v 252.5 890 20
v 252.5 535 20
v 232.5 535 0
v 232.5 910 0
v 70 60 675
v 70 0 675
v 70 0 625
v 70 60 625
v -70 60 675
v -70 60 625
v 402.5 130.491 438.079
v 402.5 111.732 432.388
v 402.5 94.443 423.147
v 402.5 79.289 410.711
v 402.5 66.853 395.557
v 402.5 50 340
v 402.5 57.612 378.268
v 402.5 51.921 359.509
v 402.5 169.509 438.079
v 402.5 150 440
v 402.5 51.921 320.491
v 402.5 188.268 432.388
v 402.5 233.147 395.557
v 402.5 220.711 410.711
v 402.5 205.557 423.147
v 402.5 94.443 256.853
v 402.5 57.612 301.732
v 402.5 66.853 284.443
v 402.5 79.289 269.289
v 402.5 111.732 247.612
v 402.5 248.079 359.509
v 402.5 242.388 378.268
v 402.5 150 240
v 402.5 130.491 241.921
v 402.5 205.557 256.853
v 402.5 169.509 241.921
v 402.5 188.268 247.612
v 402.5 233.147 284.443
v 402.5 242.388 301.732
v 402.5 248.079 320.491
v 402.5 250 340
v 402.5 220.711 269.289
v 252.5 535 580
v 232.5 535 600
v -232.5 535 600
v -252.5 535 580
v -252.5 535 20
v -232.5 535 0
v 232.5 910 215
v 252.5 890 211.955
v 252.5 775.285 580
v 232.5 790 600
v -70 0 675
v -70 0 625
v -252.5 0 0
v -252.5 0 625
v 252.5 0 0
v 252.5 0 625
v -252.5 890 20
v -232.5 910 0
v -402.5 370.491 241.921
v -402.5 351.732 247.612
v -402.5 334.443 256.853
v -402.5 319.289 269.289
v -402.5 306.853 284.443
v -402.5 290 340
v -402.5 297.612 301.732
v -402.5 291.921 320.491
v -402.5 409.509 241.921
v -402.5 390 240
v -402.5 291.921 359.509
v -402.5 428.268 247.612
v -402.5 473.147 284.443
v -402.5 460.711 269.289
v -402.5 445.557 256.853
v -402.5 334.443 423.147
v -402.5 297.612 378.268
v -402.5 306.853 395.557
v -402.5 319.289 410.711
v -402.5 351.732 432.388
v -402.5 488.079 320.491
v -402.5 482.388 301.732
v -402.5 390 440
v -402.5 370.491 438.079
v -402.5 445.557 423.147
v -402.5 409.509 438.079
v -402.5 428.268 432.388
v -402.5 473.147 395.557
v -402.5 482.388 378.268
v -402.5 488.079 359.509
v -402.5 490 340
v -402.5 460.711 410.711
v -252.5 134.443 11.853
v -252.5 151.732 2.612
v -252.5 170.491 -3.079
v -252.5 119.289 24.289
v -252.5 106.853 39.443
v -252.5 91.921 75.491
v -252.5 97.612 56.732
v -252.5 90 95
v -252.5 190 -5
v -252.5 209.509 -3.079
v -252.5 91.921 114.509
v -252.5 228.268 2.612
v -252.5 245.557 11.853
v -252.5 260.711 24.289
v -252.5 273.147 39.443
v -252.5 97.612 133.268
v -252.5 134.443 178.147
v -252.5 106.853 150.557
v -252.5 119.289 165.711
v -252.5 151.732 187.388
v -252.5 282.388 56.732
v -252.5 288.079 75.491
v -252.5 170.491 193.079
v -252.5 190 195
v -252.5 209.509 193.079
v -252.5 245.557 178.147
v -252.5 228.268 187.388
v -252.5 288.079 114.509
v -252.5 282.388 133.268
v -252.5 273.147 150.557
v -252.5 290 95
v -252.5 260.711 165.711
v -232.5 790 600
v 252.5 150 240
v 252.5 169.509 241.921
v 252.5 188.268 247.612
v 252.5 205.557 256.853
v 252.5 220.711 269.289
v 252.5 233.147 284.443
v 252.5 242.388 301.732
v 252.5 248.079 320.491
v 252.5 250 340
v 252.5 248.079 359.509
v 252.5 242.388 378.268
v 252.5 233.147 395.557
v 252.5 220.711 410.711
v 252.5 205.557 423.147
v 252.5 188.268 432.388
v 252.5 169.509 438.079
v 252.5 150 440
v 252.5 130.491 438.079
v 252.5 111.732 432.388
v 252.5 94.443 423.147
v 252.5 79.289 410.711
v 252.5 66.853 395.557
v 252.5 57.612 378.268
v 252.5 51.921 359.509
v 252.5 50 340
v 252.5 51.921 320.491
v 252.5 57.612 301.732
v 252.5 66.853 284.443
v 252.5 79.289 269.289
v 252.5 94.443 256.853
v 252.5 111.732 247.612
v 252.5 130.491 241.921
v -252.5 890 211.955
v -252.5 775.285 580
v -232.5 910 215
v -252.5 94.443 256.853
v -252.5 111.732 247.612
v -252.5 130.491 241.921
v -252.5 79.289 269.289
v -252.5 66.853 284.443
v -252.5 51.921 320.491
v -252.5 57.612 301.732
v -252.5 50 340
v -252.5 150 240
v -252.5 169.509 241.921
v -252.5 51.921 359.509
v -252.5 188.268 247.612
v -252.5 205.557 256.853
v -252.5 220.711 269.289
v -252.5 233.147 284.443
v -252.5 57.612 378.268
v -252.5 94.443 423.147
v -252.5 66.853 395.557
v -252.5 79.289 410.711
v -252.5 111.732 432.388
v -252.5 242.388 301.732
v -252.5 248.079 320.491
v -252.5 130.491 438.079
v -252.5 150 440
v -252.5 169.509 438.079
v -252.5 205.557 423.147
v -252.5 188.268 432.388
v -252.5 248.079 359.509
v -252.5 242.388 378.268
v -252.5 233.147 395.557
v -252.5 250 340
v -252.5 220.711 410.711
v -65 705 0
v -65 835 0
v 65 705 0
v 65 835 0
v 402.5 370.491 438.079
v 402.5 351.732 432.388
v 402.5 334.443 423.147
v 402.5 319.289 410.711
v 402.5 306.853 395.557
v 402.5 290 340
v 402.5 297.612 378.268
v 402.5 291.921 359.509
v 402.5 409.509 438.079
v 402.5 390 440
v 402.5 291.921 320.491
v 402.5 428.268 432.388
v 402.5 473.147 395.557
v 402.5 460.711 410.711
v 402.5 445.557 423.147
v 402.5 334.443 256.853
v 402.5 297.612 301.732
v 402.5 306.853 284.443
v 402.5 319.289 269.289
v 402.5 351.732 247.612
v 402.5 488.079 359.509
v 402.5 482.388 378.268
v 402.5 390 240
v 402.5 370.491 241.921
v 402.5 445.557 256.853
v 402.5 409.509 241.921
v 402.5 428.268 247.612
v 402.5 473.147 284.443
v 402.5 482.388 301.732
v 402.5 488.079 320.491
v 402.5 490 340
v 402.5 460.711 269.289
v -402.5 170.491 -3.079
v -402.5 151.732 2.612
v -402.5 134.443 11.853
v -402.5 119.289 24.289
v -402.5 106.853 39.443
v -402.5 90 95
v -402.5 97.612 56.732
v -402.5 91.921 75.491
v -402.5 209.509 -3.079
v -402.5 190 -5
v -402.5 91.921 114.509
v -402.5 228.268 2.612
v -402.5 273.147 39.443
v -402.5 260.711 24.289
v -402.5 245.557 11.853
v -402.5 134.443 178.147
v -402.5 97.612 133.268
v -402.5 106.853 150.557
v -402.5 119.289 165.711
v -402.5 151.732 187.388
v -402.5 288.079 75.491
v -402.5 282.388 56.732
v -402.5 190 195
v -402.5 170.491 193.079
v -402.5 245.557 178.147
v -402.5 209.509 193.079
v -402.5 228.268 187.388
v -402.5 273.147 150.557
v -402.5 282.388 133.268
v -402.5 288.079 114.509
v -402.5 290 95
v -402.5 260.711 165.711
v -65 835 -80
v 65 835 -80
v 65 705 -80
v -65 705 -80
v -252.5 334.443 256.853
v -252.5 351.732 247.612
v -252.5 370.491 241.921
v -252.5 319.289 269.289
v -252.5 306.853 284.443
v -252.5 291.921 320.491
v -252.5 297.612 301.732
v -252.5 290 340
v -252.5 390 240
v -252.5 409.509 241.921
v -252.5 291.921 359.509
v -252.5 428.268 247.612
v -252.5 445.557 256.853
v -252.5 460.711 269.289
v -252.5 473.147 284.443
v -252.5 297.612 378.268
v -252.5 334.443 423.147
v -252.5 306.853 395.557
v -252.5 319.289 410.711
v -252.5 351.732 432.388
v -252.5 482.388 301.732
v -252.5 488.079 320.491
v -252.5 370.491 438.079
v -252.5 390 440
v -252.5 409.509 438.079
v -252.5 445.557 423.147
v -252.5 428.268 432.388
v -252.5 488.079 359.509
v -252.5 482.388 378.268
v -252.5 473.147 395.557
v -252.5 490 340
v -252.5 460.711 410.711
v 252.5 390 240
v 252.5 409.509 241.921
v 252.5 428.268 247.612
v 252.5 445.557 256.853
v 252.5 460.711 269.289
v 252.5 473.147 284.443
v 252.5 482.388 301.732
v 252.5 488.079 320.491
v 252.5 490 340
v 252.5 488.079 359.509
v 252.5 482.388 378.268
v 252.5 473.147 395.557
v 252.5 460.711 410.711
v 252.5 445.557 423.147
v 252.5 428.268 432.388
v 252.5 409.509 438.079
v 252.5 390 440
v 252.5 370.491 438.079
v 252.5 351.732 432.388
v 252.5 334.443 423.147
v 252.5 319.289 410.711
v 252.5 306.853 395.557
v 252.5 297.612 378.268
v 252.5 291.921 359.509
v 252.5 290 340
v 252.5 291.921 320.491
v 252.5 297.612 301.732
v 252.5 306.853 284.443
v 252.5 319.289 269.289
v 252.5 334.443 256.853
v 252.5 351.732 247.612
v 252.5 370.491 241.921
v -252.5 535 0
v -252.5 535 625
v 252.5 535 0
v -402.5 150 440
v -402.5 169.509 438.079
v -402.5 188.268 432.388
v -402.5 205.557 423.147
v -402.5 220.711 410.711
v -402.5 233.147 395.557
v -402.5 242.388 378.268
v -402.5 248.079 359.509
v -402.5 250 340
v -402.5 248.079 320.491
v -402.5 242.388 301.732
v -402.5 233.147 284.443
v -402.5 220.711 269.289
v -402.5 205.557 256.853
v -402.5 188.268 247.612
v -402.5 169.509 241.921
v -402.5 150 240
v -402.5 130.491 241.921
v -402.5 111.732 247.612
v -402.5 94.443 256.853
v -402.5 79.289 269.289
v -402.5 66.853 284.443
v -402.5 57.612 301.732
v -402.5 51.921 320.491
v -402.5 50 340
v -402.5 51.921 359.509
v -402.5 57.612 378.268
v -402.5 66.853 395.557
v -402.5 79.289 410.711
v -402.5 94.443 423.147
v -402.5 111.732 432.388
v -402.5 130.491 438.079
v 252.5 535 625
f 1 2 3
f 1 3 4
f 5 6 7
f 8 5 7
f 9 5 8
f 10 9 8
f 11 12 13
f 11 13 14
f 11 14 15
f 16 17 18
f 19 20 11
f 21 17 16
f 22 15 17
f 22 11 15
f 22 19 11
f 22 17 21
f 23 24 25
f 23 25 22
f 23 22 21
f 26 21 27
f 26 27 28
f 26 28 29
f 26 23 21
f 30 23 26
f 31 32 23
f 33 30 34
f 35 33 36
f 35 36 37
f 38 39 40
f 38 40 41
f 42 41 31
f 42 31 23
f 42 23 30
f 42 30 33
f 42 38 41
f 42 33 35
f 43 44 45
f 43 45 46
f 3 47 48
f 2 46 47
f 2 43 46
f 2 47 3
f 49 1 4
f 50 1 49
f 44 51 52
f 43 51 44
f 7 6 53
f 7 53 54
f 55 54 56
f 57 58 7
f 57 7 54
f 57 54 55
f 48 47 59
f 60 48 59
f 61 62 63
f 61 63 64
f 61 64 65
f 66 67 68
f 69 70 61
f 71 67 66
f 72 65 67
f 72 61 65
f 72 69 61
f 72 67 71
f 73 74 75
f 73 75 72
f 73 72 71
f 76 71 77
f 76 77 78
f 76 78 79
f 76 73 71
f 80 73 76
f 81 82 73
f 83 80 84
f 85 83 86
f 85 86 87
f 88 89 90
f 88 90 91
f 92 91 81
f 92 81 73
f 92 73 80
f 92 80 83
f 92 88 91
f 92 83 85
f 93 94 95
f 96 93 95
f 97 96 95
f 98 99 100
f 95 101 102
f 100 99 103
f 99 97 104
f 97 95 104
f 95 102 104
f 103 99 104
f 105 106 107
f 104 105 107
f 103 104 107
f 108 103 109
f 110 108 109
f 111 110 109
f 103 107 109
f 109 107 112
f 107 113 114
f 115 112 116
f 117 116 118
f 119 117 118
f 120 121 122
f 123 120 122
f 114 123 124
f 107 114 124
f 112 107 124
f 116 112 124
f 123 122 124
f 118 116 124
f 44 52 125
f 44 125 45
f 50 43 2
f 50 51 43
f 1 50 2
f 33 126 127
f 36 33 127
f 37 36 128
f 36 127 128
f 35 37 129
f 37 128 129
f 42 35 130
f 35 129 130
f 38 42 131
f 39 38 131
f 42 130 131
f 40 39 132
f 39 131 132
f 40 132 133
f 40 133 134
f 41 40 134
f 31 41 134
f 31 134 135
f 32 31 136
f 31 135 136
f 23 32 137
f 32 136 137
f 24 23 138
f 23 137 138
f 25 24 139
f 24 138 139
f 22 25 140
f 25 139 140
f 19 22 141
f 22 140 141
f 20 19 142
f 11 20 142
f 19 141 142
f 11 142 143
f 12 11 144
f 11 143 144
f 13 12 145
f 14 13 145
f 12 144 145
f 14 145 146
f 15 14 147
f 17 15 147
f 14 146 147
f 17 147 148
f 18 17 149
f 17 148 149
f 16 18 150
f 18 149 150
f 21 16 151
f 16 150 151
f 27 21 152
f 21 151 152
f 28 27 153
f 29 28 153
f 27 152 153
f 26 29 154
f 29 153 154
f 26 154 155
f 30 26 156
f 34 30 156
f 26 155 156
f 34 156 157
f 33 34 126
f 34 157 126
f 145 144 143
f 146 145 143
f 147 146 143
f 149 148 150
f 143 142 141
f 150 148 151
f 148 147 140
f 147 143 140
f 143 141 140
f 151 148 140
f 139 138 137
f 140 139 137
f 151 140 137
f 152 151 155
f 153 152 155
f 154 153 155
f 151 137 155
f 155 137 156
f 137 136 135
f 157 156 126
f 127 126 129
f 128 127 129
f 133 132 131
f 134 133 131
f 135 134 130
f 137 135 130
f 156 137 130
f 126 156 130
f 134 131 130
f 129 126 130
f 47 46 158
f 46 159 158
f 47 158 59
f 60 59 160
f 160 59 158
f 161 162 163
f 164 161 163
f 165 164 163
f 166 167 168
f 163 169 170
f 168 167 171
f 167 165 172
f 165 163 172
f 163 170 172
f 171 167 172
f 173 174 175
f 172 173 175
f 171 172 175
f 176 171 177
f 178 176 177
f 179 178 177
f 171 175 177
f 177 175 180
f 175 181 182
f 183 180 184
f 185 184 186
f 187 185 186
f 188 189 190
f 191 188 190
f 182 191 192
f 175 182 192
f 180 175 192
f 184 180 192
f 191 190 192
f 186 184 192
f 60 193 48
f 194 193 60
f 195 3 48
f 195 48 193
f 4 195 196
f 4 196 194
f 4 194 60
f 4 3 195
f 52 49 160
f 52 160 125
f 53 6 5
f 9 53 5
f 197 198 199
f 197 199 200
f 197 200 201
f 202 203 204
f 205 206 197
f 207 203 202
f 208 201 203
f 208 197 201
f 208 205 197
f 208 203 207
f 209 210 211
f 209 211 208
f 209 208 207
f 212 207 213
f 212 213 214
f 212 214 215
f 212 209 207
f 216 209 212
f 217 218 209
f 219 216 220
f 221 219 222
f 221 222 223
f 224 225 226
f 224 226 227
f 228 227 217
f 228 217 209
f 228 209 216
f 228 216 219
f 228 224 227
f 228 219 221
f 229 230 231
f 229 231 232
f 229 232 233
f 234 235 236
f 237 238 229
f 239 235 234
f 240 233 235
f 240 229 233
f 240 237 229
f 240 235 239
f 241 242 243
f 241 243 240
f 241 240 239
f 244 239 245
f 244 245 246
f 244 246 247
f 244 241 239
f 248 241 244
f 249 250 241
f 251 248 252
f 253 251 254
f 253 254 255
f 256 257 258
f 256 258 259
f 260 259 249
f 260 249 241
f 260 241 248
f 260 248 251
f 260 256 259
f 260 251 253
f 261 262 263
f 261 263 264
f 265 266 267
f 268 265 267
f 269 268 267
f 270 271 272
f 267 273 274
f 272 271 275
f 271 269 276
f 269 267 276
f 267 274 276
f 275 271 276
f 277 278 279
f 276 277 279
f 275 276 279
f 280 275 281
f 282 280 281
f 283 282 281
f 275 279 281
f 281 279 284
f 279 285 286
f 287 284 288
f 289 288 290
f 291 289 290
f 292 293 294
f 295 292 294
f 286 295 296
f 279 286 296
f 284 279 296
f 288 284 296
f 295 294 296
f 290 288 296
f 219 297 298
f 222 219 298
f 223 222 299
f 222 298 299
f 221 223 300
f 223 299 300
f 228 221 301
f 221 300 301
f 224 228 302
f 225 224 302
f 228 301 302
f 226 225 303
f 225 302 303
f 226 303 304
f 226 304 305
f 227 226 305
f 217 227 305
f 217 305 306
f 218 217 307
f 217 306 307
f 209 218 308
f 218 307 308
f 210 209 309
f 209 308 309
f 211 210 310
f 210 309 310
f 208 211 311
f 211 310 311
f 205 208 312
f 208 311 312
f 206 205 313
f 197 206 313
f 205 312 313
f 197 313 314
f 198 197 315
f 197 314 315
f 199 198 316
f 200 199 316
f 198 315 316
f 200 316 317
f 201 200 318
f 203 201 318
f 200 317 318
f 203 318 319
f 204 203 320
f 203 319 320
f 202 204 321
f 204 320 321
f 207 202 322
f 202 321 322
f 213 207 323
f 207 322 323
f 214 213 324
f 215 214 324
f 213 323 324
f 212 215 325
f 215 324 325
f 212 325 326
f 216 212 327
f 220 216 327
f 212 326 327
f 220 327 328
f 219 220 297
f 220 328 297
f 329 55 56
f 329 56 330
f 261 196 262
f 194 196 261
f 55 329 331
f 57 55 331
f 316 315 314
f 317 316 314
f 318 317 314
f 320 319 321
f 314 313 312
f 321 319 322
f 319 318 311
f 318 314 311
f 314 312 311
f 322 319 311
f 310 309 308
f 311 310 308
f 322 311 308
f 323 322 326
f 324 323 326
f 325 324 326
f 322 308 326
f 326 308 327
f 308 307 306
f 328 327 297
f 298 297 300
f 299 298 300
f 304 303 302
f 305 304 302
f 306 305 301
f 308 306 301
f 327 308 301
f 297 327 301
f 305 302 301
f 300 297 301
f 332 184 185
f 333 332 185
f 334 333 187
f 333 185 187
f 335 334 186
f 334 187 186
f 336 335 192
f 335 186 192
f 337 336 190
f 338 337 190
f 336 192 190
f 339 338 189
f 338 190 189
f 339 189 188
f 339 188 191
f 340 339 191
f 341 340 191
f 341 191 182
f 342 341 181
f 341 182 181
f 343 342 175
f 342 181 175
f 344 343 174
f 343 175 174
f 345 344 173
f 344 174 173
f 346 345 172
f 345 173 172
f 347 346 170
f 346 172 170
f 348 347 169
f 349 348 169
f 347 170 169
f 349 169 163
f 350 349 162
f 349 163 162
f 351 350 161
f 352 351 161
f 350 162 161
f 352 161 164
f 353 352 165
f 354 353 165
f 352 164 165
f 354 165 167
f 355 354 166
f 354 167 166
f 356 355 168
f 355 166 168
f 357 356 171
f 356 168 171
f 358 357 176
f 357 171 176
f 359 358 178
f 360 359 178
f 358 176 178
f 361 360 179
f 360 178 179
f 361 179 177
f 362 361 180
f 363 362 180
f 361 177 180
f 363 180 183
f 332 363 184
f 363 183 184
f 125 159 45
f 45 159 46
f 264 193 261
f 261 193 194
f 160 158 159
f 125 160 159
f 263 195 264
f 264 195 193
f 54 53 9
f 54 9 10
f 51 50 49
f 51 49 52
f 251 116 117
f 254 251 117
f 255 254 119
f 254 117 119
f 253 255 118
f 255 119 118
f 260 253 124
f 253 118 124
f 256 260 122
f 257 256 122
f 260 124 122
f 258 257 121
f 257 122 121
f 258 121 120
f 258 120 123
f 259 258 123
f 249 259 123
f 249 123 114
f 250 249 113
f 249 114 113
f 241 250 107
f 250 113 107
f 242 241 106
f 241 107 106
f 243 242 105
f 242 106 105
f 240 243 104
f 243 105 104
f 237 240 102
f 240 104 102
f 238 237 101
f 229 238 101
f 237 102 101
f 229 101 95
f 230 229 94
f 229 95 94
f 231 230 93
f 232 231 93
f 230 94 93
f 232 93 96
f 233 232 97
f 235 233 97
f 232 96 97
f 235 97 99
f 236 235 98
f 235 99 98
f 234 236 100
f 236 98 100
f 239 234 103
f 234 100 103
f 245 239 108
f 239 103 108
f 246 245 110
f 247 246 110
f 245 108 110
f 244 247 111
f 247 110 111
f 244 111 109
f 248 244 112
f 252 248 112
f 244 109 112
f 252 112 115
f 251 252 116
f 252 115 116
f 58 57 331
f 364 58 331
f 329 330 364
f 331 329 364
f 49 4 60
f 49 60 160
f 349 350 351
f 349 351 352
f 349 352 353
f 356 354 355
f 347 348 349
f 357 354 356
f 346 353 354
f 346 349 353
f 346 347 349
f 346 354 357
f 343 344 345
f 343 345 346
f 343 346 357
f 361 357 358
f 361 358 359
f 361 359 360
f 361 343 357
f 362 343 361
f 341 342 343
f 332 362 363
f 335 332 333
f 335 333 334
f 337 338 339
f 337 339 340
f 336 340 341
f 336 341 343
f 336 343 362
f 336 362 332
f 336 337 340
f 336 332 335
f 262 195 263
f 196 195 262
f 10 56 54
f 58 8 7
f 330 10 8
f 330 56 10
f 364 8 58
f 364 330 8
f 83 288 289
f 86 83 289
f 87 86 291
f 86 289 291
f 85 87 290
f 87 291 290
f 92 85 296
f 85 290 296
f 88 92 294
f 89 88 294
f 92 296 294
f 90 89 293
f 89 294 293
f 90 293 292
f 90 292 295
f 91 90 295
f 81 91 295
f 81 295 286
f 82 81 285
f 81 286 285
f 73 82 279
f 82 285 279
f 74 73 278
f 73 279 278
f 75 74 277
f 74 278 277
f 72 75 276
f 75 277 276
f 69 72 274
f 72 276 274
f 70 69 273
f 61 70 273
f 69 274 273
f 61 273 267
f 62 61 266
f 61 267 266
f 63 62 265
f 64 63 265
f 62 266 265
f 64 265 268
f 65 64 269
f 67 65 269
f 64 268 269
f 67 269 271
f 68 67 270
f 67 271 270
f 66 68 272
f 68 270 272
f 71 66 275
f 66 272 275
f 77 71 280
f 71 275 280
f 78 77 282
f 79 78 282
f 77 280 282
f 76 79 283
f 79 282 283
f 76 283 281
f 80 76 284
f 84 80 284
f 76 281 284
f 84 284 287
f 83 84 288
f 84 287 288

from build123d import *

# Parameters (mm, degrees)
SKETCH1_W             = 505
SKETCH1_H             = 535
BOSS_EXTRUDE1_DEPTH   = 625
SKETCH2_W             = 75
SKETCH2_H             = 60
BOSS_EXTRUDE2_DEPTH   = 70
SKETCH3_R             = 100
BOSS_EXTRUDE3_DEPTH   = 150
BOSS_EXTRUDE3_2_DEPTH = 150
BOSS_EXTRUDE3_3_DEPTH = 150
SKETCH4_R             = 100
BOSS_EXTRUDE4_DEPTH   = 150
BOSS_EXTRUDE4_2_DEPTH = 150
BOSS_EXTRUDE5_DEPTH   = 252.5
CHAMFER1_SIZE         = 20
SKETCH6_W             = 130
SKETCH6_H             = 130
BOSS_EXTRUDE6_DEPTH   = 80


with BuildPart() as part:
    # Sketch1 → Boss-Extrude1 (new body)
    with BuildSketch(Plane.XY):
        with Locations((0, 267.5)):
            Rectangle(SKETCH1_W, SKETCH1_H)
    extrude(amount=BOSS_EXTRUDE1_DEPTH)

    # Sketch2 → Boss-Extrude2 (add, symmetric)
    with BuildSketch(Plane(origin=(0, 0, 0), x_dir=(0, 0, -1), z_dir=(1, 0, 0))):
        with Locations((-637.5, 30)):
            Rectangle(SKETCH2_W, SKETCH2_H)
    extrude(amount=BOSS_EXTRUDE2_DEPTH, both=True)


with BuildPart() as body_2:
    # Sketch3 → Boss-Extrude3 (new body)
    with BuildSketch(Plane.ZY.offset(252.5)):
        with Locations((340, 390)):
            Circle(SKETCH3_R)
    extrude(amount=BOSS_EXTRUDE3_DEPTH)


with BuildPart() as body_3:
    # Sketch3 → Boss-Extrude3 2 (new body)
    with BuildSketch(Plane.ZY.offset(252.5)):
        with Locations((95, 190)):
            Circle(SKETCH3_R)
    extrude(amount=BOSS_EXTRUDE3_2_DEPTH)


with BuildPart() as body_4:
    # Sketch3 → Boss-Extrude3 3 (new body)
    with BuildSketch(Plane.ZY.offset(252.5)):
        with Locations((340, 150)):
            Circle(SKETCH3_R)
    extrude(amount=BOSS_EXTRUDE3_3_DEPTH)


with BuildPart() as body_5:
    # Sketch4 → Boss-Extrude4 (new body)
    with BuildSketch(Plane(origin=(252.5, 0, 0), x_dir=(0, 0, -1), z_dir=(1, 0, 0))):
        with Locations((-340, 390)):
            Circle(SKETCH4_R)
    extrude(amount=BOSS_EXTRUDE4_DEPTH)


with BuildPart() as body_6:
    # Sketch4 → Boss-Extrude4 2 (new body)
    with BuildSketch(Plane(origin=(252.5, 0, 0), x_dir=(0, 0, -1), z_dir=(1, 0, 0))):
        with Locations((-340, 150)):
            Circle(SKETCH4_R)
    extrude(amount=BOSS_EXTRUDE4_2_DEPTH)


with BuildPart() as body_7:
    # Sketch5 → Boss-Extrude5 (new, symmetric)
    with BuildSketch(Plane(origin=(0, 0, 0), x_dir=(0, 0, -1), z_dir=(1, 0, 0))):
        Polygon((-600, 790), (-600, 535), (0, 535), (0, 910), (-215, 910), align=None)
    extrude(amount=BOSS_EXTRUDE5_DEPTH, both=True)

    # Chamfer1
    chamfer1_edges = [body_7.edges().sort_by_distance(p)[0] for p in [
        (252.5, 722.5, 0),
        (252.5, 910, 107.5),
        (252.5, 850, 407.5),
        (-252.5, 910, 107.5),
        (-252.5, 722.5, 0),
        (-252.5, 662.5, 600),
        (-252.5, 850, 407.5),
        (252.5, 662.5, 600),
    ]]
    chamfer(chamfer1_edges, length=CHAMFER1_SIZE)

    # Sketch6 → Boss-Extrude6 (add)
    with BuildSketch(Plane(origin=(0, 0, 0), x_dir=(-1, 0, 0), z_dir=(0, 0, -1))):
        with Locations((0, 770)):
            Rectangle(SKETCH6_W, SKETCH6_H)
    extrude(amount=BOSS_EXTRUDE6_DEPTH)


solid = Compound([part.part, body_2.part, body_3.part, body_4.part, body_5.part, body_6.part, body_7.part])
